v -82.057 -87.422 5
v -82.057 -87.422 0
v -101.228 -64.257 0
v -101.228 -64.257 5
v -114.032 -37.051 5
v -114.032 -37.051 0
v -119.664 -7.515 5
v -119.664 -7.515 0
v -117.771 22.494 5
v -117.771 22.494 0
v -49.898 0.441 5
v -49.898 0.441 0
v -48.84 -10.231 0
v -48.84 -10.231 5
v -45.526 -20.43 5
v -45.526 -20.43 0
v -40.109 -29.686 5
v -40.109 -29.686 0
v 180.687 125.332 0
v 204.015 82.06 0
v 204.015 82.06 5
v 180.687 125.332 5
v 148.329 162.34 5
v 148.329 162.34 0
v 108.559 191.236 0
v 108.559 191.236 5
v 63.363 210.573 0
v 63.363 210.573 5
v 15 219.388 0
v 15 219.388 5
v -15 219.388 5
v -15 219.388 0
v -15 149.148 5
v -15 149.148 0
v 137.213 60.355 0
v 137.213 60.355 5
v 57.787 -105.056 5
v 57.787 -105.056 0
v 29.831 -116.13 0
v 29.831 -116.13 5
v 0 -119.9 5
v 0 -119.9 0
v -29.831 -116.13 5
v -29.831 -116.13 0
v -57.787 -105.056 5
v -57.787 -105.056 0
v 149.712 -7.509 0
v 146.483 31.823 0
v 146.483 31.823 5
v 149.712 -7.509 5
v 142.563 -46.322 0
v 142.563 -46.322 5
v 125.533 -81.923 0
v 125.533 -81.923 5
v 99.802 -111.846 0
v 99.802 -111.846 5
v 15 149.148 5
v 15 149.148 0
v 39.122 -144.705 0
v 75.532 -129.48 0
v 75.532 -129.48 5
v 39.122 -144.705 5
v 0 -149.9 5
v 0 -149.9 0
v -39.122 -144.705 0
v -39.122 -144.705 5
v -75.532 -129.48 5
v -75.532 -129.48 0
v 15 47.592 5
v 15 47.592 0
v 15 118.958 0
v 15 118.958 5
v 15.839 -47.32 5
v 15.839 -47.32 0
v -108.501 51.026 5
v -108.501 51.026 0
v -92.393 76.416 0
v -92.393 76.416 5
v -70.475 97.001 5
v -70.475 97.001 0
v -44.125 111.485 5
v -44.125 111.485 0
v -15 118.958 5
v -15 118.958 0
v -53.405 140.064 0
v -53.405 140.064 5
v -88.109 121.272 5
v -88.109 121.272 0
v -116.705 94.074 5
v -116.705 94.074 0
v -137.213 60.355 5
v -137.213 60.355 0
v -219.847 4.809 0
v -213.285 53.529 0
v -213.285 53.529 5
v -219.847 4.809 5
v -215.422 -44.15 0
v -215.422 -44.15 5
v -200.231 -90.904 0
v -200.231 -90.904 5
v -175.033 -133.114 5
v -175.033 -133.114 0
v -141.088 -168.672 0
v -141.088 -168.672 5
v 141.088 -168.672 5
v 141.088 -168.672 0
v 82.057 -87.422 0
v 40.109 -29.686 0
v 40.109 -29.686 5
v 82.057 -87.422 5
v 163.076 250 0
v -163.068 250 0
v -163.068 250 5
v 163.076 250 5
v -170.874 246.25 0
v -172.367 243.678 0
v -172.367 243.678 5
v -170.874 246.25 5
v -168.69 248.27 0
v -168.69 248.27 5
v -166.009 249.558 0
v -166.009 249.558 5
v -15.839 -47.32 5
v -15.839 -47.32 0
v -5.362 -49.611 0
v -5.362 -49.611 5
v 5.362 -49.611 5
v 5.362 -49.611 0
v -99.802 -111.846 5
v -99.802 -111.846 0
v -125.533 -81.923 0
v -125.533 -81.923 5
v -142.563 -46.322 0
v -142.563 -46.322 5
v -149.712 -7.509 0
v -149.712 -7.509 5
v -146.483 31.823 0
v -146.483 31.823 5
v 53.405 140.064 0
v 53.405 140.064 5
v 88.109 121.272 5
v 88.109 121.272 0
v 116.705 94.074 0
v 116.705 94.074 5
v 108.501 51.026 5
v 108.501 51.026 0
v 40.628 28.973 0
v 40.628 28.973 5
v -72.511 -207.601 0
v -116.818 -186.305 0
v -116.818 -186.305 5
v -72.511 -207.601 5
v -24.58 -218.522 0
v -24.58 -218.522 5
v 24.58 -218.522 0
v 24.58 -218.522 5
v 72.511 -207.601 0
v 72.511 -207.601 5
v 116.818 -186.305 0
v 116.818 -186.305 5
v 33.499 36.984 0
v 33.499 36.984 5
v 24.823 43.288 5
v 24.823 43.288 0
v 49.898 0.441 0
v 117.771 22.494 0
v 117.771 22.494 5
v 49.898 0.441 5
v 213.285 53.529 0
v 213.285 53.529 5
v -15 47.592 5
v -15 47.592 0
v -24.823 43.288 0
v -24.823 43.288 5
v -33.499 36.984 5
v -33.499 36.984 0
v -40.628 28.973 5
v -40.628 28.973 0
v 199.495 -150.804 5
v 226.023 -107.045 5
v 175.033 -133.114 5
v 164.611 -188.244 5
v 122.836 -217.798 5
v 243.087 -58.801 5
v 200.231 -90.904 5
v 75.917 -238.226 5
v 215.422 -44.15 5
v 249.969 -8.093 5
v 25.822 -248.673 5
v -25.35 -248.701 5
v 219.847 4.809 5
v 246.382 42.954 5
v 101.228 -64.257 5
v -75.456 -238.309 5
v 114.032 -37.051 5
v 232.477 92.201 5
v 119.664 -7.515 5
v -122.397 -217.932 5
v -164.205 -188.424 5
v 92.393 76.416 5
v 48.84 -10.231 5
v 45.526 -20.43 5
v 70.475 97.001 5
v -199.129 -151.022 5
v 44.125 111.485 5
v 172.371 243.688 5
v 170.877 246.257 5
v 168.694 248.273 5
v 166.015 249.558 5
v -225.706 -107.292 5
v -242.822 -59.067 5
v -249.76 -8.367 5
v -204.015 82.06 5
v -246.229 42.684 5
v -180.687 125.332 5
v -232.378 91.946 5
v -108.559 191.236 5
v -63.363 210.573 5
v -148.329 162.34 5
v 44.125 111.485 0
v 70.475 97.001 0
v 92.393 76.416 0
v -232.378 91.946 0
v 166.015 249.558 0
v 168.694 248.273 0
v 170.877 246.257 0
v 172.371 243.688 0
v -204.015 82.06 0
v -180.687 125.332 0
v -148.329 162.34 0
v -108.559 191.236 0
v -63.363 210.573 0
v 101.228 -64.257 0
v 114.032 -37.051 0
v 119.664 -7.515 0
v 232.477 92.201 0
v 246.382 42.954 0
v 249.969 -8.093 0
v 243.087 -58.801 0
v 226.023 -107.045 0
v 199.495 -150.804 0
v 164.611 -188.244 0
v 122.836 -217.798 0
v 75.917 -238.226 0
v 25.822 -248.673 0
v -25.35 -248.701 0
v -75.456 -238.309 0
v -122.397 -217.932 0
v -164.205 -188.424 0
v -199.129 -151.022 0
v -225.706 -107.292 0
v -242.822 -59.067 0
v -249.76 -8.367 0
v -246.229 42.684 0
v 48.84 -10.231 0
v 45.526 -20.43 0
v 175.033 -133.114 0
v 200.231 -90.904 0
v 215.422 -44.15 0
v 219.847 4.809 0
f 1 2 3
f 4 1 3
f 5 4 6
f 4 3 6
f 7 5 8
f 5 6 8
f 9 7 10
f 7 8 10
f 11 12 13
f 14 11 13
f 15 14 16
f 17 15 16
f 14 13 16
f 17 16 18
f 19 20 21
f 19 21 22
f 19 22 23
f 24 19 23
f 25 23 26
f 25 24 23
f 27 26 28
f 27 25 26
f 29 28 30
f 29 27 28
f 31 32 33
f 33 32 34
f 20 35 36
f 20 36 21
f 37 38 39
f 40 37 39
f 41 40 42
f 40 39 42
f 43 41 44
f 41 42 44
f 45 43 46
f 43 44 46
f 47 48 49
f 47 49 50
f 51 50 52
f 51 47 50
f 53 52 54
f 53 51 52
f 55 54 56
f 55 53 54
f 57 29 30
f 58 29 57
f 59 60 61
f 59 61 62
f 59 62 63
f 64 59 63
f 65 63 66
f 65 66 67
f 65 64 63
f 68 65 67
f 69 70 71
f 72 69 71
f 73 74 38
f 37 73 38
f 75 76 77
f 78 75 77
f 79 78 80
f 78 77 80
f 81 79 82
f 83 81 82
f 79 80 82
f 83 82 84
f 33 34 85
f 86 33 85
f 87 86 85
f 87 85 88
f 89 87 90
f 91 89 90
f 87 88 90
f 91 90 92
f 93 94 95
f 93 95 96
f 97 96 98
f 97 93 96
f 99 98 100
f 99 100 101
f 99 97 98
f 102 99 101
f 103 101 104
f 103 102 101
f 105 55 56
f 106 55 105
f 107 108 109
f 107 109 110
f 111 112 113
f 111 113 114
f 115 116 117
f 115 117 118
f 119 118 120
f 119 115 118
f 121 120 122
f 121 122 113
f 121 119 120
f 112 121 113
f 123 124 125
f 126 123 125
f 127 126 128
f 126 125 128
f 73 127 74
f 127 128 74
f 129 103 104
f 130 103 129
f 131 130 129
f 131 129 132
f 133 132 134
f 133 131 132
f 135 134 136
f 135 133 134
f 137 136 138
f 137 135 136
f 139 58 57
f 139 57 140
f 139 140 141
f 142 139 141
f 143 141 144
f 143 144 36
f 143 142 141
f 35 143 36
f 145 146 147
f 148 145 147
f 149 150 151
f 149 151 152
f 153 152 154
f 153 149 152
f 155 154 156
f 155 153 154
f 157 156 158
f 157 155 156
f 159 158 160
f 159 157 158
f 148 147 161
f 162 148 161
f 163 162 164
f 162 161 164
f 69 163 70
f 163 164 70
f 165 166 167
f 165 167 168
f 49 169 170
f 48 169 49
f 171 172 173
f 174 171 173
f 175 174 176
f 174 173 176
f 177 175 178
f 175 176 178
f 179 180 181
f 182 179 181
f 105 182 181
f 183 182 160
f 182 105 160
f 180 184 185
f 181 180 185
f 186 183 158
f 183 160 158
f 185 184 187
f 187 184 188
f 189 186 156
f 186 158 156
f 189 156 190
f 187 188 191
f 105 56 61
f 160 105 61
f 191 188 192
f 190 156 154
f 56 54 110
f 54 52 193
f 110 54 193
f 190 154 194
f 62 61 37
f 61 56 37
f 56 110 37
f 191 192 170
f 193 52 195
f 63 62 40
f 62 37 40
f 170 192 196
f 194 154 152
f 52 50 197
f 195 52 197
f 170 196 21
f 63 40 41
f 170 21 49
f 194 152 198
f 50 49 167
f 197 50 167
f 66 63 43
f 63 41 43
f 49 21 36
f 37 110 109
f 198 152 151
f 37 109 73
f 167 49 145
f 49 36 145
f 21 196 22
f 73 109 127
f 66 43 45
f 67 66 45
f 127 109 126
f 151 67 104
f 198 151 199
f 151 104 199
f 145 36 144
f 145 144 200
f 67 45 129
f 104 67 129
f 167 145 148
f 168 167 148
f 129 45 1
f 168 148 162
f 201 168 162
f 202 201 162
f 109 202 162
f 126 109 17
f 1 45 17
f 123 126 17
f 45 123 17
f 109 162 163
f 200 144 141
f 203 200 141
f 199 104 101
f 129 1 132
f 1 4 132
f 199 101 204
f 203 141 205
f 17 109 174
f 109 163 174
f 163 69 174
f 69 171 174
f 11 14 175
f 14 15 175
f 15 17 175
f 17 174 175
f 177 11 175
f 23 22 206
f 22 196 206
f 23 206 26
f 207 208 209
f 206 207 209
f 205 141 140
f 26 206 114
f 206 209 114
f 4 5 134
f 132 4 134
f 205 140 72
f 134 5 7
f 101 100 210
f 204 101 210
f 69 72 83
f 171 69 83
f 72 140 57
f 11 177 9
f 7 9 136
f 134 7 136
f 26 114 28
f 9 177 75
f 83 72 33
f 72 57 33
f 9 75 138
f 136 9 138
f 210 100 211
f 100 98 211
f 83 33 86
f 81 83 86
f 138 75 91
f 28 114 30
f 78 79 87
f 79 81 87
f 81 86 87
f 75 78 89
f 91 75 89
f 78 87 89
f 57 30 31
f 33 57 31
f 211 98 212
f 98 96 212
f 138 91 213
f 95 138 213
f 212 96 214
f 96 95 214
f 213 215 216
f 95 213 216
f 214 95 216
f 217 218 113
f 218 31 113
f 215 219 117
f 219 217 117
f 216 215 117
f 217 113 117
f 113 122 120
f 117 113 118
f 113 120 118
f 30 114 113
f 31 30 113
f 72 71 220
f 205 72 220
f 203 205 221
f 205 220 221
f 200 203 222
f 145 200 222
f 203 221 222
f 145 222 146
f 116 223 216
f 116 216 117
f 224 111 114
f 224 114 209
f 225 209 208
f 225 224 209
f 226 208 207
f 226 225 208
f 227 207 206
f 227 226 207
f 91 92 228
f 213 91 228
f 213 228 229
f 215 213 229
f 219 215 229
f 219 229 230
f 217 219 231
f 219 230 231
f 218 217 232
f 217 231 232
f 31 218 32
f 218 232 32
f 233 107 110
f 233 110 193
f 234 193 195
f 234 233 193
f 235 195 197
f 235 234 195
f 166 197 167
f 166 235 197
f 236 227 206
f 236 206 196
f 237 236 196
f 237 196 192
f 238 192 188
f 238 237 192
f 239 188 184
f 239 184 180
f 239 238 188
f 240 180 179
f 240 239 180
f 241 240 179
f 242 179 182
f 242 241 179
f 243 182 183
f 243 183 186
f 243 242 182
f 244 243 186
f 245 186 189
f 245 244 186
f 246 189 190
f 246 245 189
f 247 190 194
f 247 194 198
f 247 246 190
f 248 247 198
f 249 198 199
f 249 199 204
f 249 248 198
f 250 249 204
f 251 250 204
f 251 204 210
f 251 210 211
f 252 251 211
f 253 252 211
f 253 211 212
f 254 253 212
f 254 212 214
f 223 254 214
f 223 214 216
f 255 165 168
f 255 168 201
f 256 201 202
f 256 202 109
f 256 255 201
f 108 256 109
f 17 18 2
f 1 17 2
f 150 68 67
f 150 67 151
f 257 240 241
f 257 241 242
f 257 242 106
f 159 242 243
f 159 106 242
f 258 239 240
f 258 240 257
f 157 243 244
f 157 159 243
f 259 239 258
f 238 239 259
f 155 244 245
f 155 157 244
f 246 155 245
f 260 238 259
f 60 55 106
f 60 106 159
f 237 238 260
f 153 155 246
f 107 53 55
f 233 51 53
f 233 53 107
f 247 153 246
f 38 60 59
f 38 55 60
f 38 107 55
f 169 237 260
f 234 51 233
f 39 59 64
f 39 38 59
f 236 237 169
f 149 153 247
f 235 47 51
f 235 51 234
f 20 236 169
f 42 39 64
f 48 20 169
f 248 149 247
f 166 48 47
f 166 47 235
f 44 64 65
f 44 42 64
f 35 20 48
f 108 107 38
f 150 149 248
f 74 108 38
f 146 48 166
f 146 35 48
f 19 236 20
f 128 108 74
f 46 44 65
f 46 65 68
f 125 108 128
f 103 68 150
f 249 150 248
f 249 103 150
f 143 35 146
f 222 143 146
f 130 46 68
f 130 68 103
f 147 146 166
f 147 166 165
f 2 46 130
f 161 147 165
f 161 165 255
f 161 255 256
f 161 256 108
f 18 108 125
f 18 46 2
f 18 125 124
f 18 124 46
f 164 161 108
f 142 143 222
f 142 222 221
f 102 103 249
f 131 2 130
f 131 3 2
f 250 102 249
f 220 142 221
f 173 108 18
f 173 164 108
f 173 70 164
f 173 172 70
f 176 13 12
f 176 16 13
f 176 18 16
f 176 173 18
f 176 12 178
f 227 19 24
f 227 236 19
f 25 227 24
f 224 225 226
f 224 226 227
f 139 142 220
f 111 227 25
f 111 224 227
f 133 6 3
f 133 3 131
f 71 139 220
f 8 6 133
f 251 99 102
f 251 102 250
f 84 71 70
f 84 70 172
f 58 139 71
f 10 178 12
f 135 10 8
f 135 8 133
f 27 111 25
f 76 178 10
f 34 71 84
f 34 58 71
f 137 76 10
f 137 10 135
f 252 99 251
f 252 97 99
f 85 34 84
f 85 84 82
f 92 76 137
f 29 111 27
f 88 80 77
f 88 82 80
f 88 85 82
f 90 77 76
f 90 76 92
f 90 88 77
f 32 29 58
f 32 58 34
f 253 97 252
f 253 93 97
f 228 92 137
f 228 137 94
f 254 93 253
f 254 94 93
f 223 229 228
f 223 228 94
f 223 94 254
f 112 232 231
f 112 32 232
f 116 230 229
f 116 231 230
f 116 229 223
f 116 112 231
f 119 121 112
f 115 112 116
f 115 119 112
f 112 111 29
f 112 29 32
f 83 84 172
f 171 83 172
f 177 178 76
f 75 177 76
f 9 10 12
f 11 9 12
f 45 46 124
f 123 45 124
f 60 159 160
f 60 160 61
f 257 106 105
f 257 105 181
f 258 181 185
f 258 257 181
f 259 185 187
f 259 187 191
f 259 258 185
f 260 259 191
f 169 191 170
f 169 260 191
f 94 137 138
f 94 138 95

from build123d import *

# Parameters (mm, degrees)
BOSS_EXTRUDE1_DEPTH = 5


with BuildPart() as part:
    # Sketch1 → Boss-Extrude1 (new body)
    with BuildSketch(Plane.XY):
        with BuildLine():
            Line((-232.377693895, 91.946298682), (-172.366969932, 243.677851947))
            ThreePointArc((-172.366969932, 243.677851947), (-168.690205127, 248.269779909), (-163.067862176, 250))
            Line((-163.067862176, 250), (-0.1, 250))
            Line((-0.1, 250), (163.075862176, 250))
            ThreePointArc((163.075862176, 250), (168.693678089, 248.272855877), (172.370938455, 243.688028873))
            Line((172.370938455, 243.688028873), (232.476906979, 92.200721814))
            ThreePointArc((232.476906979, 92.200721814), (0.236829395, -249.999962555), (-232.377693895, 91.946298682))
        make_face()
        with BuildLine():
            Line((15.838692049, -47.319613631), (57.786513592, -105.055836805))
            ThreePointArc((57.786513592, -105.055836805), (0, -119.9), (-57.786513592, -105.055836805))
            Line((-57.786513592, -105.055836805), (-15.838692049, -47.319613631))
            ThreePointArc((-15.838692049, -47.319613631), (0, -49.9), (15.838692049, -47.319613631))
        make_face(mode=Mode.SUBTRACT)
        with BuildLine():
            Line((-40.10920188, -29.686056062), (-82.057023423, -87.422279237))
            ThreePointArc((-82.057023423, -87.422279237), (-114.031676304, -37.051137626), (-117.771052914, 22.494201374))
            Line((-117.771052914, 22.494201374), (-49.898051904, 0.440926504))
            ThreePointArc((-49.898051904, 0.440926504), (-47.457720163, -15.419948019), (-40.10920188, -29.686056062))
        make_face(mode=Mode.SUBTRACT)
        with BuildLine():
            Line((40.10920188, -29.686056062), (82.057023423, -87.422279237))
            ThreePointArc((82.057023423, -87.422279237), (114.031676304, -37.051137626), (117.771052914, 22.494201374))
            Line((117.771052914, 22.494201374), (49.898051904, 0.440926504))
            ThreePointArc((49.898051904, 0.440926504), (47.457720163, -15.419948019), (40.10920188, -29.686056062))
        make_face(mode=Mode.SUBTRACT)
        with BuildLine():
            Line((-137.21255284, 60.354994352), (-204.01494883, 82.060408564))
            ThreePointArc((-204.01494883, 82.060408564), (-129.253976979, 177.902837063), (-15, 219.387807318))
            Line((-15, 219.387807318), (-15, 149.147611446))
            ThreePointArc((-15, 149.147611446), (-88.109009319, 121.271647457), (-137.21255284, 60.354994352))
        make_face(mode=Mode.SUBTRACT)
        with BuildLine():
            Line((-146.483062671, 31.823298863), (-213.285458662, 53.528713076))
            ThreePointArc((-213.285458662, 53.528713076), (-209.137327933, -67.952837063), (-141.08817259, -168.671685695))
            Line((-141.08817259, -168.671685695), (-99.802021338, -111.846173546))
            ThreePointArc((-99.802021338, -111.846173546), (-142.563371793, -46.321647457), (-146.483062671, 31.823298863))
        make_face(mode=Mode.SUBTRACT)
        with BuildLine():
            Line((-75.531511507, -129.479731115), (-116.817662759, -186.305243264))
            ThreePointArc((-116.817662759, -186.305243264), (0, -219.9), (116.817662759, -186.305243264))
            Line((116.817662759, -186.305243264), (75.531511507, -129.479731115))
            ThreePointArc((75.531511507, -129.479731115), (0, -149.9), (-75.531511507, -129.479731115))
        make_face(mode=Mode.SUBTRACT)
        with BuildLine():
            Line((99.802021338, -111.846173546), (141.08817259, -168.671685695))
            ThreePointArc((141.08817259, -168.671685695), (209.137327933, -67.952837063), (213.285458662, 53.528713076))
            Line((213.285458662, 53.528713076), (146.483062671, 31.823298863))
            ThreePointArc((146.483062671, 31.823298863), (142.563371793, -46.321647457), (99.802021338, -111.846173546))
        make_face(mode=Mode.SUBTRACT)
        with BuildLine():
            Line((137.21255284, 60.354994352), (204.01494883, 82.060408564))
            ThreePointArc((204.01494883, 82.060408564), (129.253976979, 177.902837063), (15, 219.387807318))
            Line((15, 219.387807318), (15, 149.147611446))
            ThreePointArc((15, 149.147611446), (88.109009319, 121.271647457), (137.21255284, 60.354994352))
        make_face(mode=Mode.SUBTRACT)
        with BuildLine():
            Line((15, 47.592121197), (15, 118.958017805))
            ThreePointArc((15, 118.958017805), (70.47545175, 97.001137626), (108.500543083, 51.025896863))
            Line((108.500543083, 51.025896863), (40.627542073, 28.972621993))
            ThreePointArc((40.627542073, 28.972621993), (29.330484089, 40.369948019), (15, 47.592121197))
        make_face(mode=Mode.SUBTRACT)
        with BuildLine():
            Line((-40.627542073, 28.972621993), (-108.500543083, 51.025896863))
            ThreePointArc((-108.500543083, 51.025896863), (-70.47545175, 97.001137626), (-15, 118.958017805))
            Line((-15, 118.958017805), (-15, 47.592121197))
            ThreePointArc((-15, 47.592121197), (-29.330484089, 40.369948019), (-40.627542073, 28.972621993))
        make_face(mode=Mode.SUBTRACT)
    extrude(amount=BOSS_EXTRUDE1_DEPTH)


solid = part.part
